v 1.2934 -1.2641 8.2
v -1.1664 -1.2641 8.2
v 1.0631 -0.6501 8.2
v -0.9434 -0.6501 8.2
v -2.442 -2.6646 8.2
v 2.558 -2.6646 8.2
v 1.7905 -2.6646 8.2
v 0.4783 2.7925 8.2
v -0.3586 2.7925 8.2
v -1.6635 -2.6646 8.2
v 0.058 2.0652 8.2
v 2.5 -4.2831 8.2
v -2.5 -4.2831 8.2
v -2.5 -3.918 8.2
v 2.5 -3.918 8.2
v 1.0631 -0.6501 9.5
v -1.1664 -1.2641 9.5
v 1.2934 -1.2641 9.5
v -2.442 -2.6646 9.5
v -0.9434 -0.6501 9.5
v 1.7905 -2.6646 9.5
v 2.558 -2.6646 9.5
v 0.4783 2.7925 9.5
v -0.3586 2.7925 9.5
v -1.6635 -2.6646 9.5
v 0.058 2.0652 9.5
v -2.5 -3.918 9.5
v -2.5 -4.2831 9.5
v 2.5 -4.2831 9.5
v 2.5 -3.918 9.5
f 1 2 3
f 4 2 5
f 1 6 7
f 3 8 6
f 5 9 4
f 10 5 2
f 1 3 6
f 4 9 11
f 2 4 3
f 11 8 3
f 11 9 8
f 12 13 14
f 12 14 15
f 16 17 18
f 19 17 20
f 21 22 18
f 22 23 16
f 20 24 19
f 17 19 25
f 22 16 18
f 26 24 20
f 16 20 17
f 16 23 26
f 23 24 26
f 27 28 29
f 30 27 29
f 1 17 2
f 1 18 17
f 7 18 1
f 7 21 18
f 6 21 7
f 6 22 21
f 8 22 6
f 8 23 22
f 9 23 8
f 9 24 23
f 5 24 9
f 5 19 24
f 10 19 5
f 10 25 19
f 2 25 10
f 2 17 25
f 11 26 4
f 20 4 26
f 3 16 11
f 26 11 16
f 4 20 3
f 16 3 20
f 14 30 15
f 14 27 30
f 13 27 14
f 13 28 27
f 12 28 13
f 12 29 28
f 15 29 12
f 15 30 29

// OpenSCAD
// file: ../modules/homing_bar.scad
function homing_bar_quality_steps(quality, preview_steps, export_steps) =
    quality == "preview" ? preview_steps : export_steps;

module homing_bar_profile(length, width, quality = "export") {
    end_steps = homing_bar_quality_steps(quality, 18, 32);
    cap_length = max(length, width);

    hull() {
        translate([-cap_length / 2 + width / 2, 0])
            circle(d = width, $fn = end_steps);
        translate([ cap_length / 2 - width / 2, 0])
            circle(d = width, $fn = end_steps);
    }
}

module homing_bar_blank(
    length,
    width,
    height,
    base_thickness,
    offset_y,
    base_z,
    quality = "export"
) {
    cap_height = max(height, 0.05);
    contact_height = max(base_thickness, 0.05);
    contact_length = length + contact_height * 1.6;
    contact_width = width + contact_height * 1.2;

    translate([0, offset_y, base_z])
        union() {
            hull() {
                linear_extrude(height = 0.01)
                    homing_bar_profile(contact_length, contact_width, quality);
                translate([0, 0, contact_height])
                    linear_extrude(height = 0.01)
                        homing_bar_profile(length, width, quality);
            }

            translate([0, 0, contact_height])
                linear_extrude(height = cap_height)
                    homing_bar_profile(length, width, quality);
        }
}
// file: ../modules/stem_alps.scad
function positive_alps_stem_dimension(value, minimum = 0.1) = max(value, minimum);

module alps_post(stem_length, stem_width, stem_height, lead_in) {
    safe_length = positive_alps_stem_dimension(stem_length);
    safe_width = positive_alps_stem_dimension(stem_width);
    safe_height = max(stem_height, 0.2);
    safe_lead_in = min(lead_in, safe_length * 0.2, safe_width * 0.3, safe_height * 0.4);

    hull() {
        linear_extrude(height = max(safe_height - safe_lead_in, 0.01))
            square([safe_length, safe_width], center = true);

        translate([0, 0, safe_height - 0.01])
            linear_extrude(height = 0.01)
                square([
                    positive_alps_stem_dimension(safe_length - safe_lead_in * 2),
                    positive_alps_stem_dimension(safe_width - safe_lead_in * 2)
                ], center = true);
    }
}

module stem_alps(
    stem_length = 4.45,
    stem_width = 2.25,
    stem_height = 3.5,
    base_clearance = 0,
    lead_in = 0.12,
    quality = "export"
) {
    translate([0, 0, base_clearance])
        alps_post(stem_length, stem_width, stem_height, lead_in);
}
// file: ../modules/stem_choc_v2.scad
use <stem_mx.scad>

module stem_choc_v2(
    outer_diameter = 5.5,
    stem_height = 6.5,
    base_clearance = 0,
    cross_width_horizontal = 1.25,
    cross_length_horizontal = 4.3,
    cross_width_vertical = 1.35,
    cross_length_vertical = 4.3,
    cross_chamfer = 0.4,
    chamfer_height = 0.6,
    quality = "export"
) {
    stem_mx(
        outer_diameter = outer_diameter,
        stem_height = stem_height,
        base_clearance = base_clearance,
        cross_width_horizontal = cross_width_horizontal,
        cross_length_horizontal = cross_length_horizontal,
        cross_width_vertical = cross_width_vertical,
        cross_length_vertical = cross_length_vertical,
        cross_chamfer = cross_chamfer,
        chamfer_height = chamfer_height,
        quality = quality
    );
}
// file: ../modules/stem_choc_v1.scad
function positive_choc_stem_dimension(value, minimum = 0.1) = max(value, minimum);

module choc_v1_prong(prong_width, prong_depth, prong_height, lead_in) {
    safe_width = positive_choc_stem_dimension(prong_width);
    safe_depth = positive_choc_stem_dimension(prong_depth);
    safe_height = max(prong_height, 0.2);
    safe_lead_in = min(lead_in, safe_width * 0.4, safe_depth * 0.2, safe_height * 0.4);

    hull() {
        linear_extrude(height = max(safe_height - safe_lead_in, 0.01))
            square([safe_width, safe_depth], center = true);

        translate([0, 0, safe_height - 0.01])
            linear_extrude(height = 0.01)
                square([
                    positive_choc_stem_dimension(safe_width - safe_lead_in * 2),
                    positive_choc_stem_dimension(safe_depth - safe_lead_in * 2)
                ], center = true);
    }
}

module stem_choc_v1(
    prong_width = 1.2,
    prong_depth = 3.0,
    prong_spacing = 5.7,
    stem_height = 3.0,
    base_clearance = 0,
    lead_in = 0.12,
    quality = "export"
) {
    for (offset_x = [prong_spacing / 2, -prong_spacing / 2]) {
        translate([offset_x, 0, base_clearance])
            choc_v1_prong(prong_width, prong_depth, stem_height, lead_in);
    }
}
// file: ../modules/stem_mx.scad
function stem_quality_steps(quality, preview_steps, export_steps) =
    quality == "preview" ? preview_steps : export_steps;

module stem_slot(length, width, height) {
    translate([-length / 2, -width / 2, 0])
        cube([length, width, height]);
}

module stem_mx(
    outer_diameter = 5.5,
    stem_height = 4.5,
    base_clearance = 0,
    cross_width_horizontal = 1.25,
    cross_length_horizontal = 4.3,
    cross_width_vertical = 1.35,
    cross_length_vertical = 4.3,
    cross_chamfer = 0.4,
    chamfer_height = 0.6,
    quality = "export"
) {
    outer_steps = stem_quality_steps(quality, 36, 64);
    safe_height = max(stem_height, 0.2);

    difference() {
        translate([0, 0, base_clearance])
            cylinder(d = outer_diameter, h = safe_height, $fn = outer_steps);

        translate([0, 0, base_clearance]) {
            stem_slot(cross_length_horizontal, cross_width_horizontal, safe_height + 1);
            stem_slot(cross_width_vertical, cross_length_vertical, safe_height + 1);
        }

        if (cross_chamfer > 0) {
            translate([0, 0, base_clearance - 0.01])
                hull() {
                    stem_slot(
                        cross_length_horizontal + cross_chamfer * 2,
                        cross_width_horizontal + cross_chamfer * 2,
                        0.01
                    );
                    translate([0, 0, chamfer_height])
                        stem_slot(cross_length_horizontal, cross_width_horizontal, 0.01);
                }

            translate([0, 0, base_clearance - 0.01])
                hull() {
                    stem_slot(
                        cross_width_vertical + cross_chamfer * 2,
                        cross_length_vertical + cross_chamfer * 2,
                        0.01
                    );
                    translate([0, 0, chamfer_height])
                        stem_slot(cross_width_vertical, cross_length_vertical, 0.01);
                }
        }
    }
}
// file: ../modules/legend_block.scad
function legend_text_length(label) = max(len(label), 1);
function legend_is_single_glyph(label) = legend_text_length(label) == 1;
function legend_quality_steps(quality, preview_steps, export_steps) =
    quality == "preview" ? preview_steps : export_steps;
function legend_text_curve_steps(quality = "export") =
    legend_quality_steps(quality, 48, 96);
function legend_text_internal_scale(quality = "export") =
    legend_quality_steps(quality, 6, 10);
function legend_single_glyph_target_width(width, depth) =
    min(width * 0.96, max(depth * 1.25, 4.8));
function legend_text_size(label, width, depth) =
    let(
        width_fit = (width * 1.5) / legend_text_length(label),
        depth_fit = depth * 0.98
    )
    max(min(depth_fit, width_fit), 1.0);

module legend_text_shape(label, size, font_name, curve_steps = 48) {
    text(
        text = label,
        size = size,
        font = font_name,
        halign = "center",
        valign = "center",
        $fn = curve_steps
    );
}

module legend_resized_text_shape(label, size, width, depth, font_name, curve_steps = 48) {
    if (legend_is_single_glyph(label)) {
        resize([legend_single_glyph_target_width(width, depth), 0, 0], auto = [false, true, true])
            legend_text_shape(
                label = label,
                size = size,
                font_name = font_name,
                curve_steps = curve_steps
            );
    } else {
        text(
            text = label,
            size = size,
            font = font_name,
            halign = "center",
            valign = "center",
            $fn = curve_steps
        );
    }
}

// Keep decoration options available across bundled fonts without requiring extra font files.
module legend_text_profile(
    label,
    size,
    width,
    depth,
    font_name,
    outline_delta = 0,
    curve_steps = 48
) {
    if (abs(outline_delta) > 0.0001) {
        offset(delta = outline_delta)
            legend_resized_text_shape(
                label = label,
                size = size,
                width = width,
                depth = depth,
                font_name = font_name,
                curve_steps = curve_steps
            );
    } else {
        legend_resized_text_shape(
            label = label,
            size = size,
            width = width,
            depth = depth,
            font_name = font_name,
            curve_steps = curve_steps
        );
    }
}

module legend_block(
    label,
    width,
    depth,
    height,
    offset_x,
    offset_y,
    base_z,
    font_name = "M PLUS 1:style=Regular",
    underline_enabled = false,
    underline_width = 0,
    underline_thickness = 0,
    underline_offset_y = 0,
    outline_delta = 0,
    quality = "export"
) {
    if (!is_undef(label) && len(label) > 0) {
        size = legend_text_size(label, width, depth);
        curve_steps = legend_text_curve_steps(quality);
        internal_scale = legend_text_internal_scale(quality);

        translate([offset_x, offset_y, base_z])
            linear_extrude(height = height, center = false, convexity = 10)
                // Build glyph outlines at a larger internal scale so the bundled runtime
                // preserves more of the original font curvature before scaling back down.
                scale([1 / internal_scale, 1 / internal_scale, 1])
                    union() {
                        legend_text_profile(
                            label = label,
                            size = size * internal_scale,
                            width = width * internal_scale,
                            depth = depth * internal_scale,
                            font_name = font_name,
                            outline_delta = outline_delta * internal_scale,
                            curve_steps = curve_steps
                        );

                        if (underline_enabled && underline_width > 0 && underline_thickness > 0) {
                            translate([0, underline_offset_y * internal_scale])
                                square(
                                    [underline_width * internal_scale, underline_thickness * internal_scale],
                                    center = true
                                );
                        }
                    }
    }
}
// file: ../presets/standard-1u.scad
default_key_width = 18;
default_key_depth = 18;
default_top_center_height = 9.5;
default_wall_thickness = 1.2;
default_top_scale = 0.84;

default_profile_front_angle = 15;
default_profile_back_angle = 15;
default_profile_left_angle = 10;
default_profile_right_angle = 10;
default_top_thickness = 1.5;
default_bottom_corner_radius = 1.0;
default_top_corner_radius = 1.5;
default_dish_radius = 45;
default_dish_depth = 0;
default_top_pitch_deg = 0;
default_top_roll_deg = 0;

default_legend_text = "A";
default_legend_font_name = "M PLUS 1:style=Regular";
default_legend_underline_enabled = false;
default_legend_underline_width = 0;
default_legend_underline_thickness = 0;
default_legend_underline_offset_y = 0;
default_legend_width = 7.2;
default_legend_depth = 4.0;
default_legend_height = 0;
default_legend_outline_delta = 0;
default_legend_offset_x = 0;
default_legend_offset_y = 0;
default_legend_embed = 0.6;

default_homing_bar_enabled = false;
default_homing_bar_height = 0.6;
default_homing_bar_length = 4;
default_homing_bar_width = 1.58;
default_homing_bar_offset_y = -3.5;
default_homing_bar_base_thickness = 0.35;

default_stem_outer_diameter = 5.5;
default_stem_width = default_stem_outer_diameter;
default_stem_depth = default_stem_outer_diameter;
default_stem_height = 6.5;
default_stem_inset = 0;
default_stem_cross_width_horizontal = 1.25;
default_stem_cross_length_horizontal = 4.3;
default_stem_cross_width_vertical = 1.35;
default_stem_cross_length_vertical = 4.3;
default_stem_cross_chamfer = 0.4;

default_stem_type = "choc_v2";

default_stem_mx_outer_diameter = 5.5;
default_stem_mx_height = 4.5;
default_stem_mx_inset = 0;
default_stem_mx_cross_width_horizontal = default_stem_cross_width_horizontal;
default_stem_mx_cross_length_horizontal = default_stem_cross_length_horizontal;
default_stem_mx_cross_width_vertical = default_stem_cross_width_vertical;
default_stem_mx_cross_length_vertical = default_stem_cross_length_vertical;
default_stem_mx_cross_chamfer = default_stem_cross_chamfer;

default_stem_choc_v2_outer_diameter = default_stem_outer_diameter;
default_stem_choc_v2_height = default_stem_height;
default_stem_choc_v2_inset = default_stem_inset;
default_stem_choc_v2_cross_width_horizontal = default_stem_cross_width_horizontal;
default_stem_choc_v2_cross_length_horizontal = default_stem_cross_length_horizontal;
default_stem_choc_v2_cross_width_vertical = default_stem_cross_width_vertical;
default_stem_choc_v2_cross_length_vertical = default_stem_cross_length_vertical;
default_stem_choc_v2_cross_chamfer = default_stem_cross_chamfer;

default_stem_choc_v1_height = 3.0;
default_stem_choc_v1_inset = 0;
default_stem_choc_v1_prong_width = 1.2;
default_stem_choc_v1_prong_depth = 3.0;
default_stem_choc_v1_prong_spacing = 5.7;
default_stem_choc_v1_lead_in = 0.12;

default_stem_alps_height = 3.5;
default_stem_alps_inset = 0;
default_stem_alps_length = 4.45;
default_stem_alps_width = 2.25;
default_stem_alps_lead_in = 0.12;
// main file
export_target = "legend";

user_key_width = 18;
user_key_depth = 18;
user_top_center_height = 9.5;
user_top_pitch_deg = 0;
user_top_roll_deg = 0;
user_wall_thickness = 1.2;
user_top_scale = 0.84;
user_dish_radius = 45;
user_dish_depth = 0;

user_legend_enabled = true;
user_legend_text = "A";
user_legend_font_name = "M PLUS 1:style=Thin";
user_legend_underline_enabled = true;
// Derived from MPLUS1-Variable.ttf metrics plus the single-glyph resize scale used by legend_block().
user_legend_underline_width = 5.0;
user_legend_underline_thickness = 0.36510;
user_legend_underline_offset_y = -4.10060;
user_legend_width = 7.2;
user_legend_depth = 4.0;
user_legend_height = 0;
user_legend_embed = 0.6;
user_legend_outline_delta = 0;

user_homing_bar_enabled = false;
user_stem_type = "none";
user_stem_enabled = false;

include <../base/keycap.scad>
